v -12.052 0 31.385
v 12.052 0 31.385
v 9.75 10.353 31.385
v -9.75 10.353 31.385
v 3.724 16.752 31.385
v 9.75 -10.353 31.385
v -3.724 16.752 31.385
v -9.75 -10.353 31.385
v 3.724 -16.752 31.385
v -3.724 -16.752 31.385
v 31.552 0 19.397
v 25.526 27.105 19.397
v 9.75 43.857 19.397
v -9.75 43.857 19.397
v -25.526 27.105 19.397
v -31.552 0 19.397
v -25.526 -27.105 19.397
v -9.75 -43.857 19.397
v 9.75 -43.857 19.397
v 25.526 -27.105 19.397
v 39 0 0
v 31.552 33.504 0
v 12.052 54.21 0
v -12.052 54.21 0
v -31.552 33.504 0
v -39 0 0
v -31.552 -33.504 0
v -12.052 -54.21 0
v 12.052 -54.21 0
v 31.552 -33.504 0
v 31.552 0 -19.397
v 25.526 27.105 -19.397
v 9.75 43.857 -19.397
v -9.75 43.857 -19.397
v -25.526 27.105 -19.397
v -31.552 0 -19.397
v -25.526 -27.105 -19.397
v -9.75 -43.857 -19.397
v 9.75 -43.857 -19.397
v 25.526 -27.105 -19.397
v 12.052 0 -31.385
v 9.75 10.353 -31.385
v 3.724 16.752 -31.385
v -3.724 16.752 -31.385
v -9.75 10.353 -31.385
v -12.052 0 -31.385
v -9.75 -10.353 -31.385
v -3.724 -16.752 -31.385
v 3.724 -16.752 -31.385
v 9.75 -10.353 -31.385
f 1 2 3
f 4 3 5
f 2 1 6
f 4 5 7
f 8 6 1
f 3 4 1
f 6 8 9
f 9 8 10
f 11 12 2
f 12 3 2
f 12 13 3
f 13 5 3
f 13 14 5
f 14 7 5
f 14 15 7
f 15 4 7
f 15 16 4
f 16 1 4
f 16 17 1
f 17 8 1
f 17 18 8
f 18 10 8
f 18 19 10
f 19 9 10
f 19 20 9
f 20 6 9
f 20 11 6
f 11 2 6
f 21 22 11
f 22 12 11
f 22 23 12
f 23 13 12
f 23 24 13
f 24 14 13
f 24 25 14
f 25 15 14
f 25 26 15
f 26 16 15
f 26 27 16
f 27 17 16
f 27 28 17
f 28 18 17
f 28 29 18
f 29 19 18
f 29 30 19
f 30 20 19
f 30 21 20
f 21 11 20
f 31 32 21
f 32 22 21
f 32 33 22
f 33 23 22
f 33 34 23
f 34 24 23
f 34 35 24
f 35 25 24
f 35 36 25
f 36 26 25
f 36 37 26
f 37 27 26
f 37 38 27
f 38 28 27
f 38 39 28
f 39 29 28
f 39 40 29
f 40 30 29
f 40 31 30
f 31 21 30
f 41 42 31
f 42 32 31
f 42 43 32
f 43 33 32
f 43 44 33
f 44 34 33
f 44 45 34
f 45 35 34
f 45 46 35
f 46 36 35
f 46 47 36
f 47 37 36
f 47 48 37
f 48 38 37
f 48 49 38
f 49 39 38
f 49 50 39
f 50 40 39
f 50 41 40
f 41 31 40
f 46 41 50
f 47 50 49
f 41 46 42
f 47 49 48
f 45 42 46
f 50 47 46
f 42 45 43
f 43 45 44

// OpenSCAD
// Generated by SolidPython 1.0.1 on 2020-07-29 00:46:51


scale(v = [13, 19, 11]) {
	sphere(r = 3);
}
/***********************************************
*********      SolidPython code:      **********
************************************************
 
# import packages: SolidPython
from solid import *
from solid.utils import *
from itertools import chain, combinations, permutations


class Resize:

    def __init__(self, scad_file):
        self.scad_file = scad_file
        #self.scad_file = import_scad(scad_file)
        # cone/cylinder param:
        self.r1 = 0
        self.r2 = 0
        self.h = 0
        # rectangular prism param:
        self.w = 0
        self.l = 0
        # ellipse param:
        self.r = 0

    # import OpenScad code (file name corresponds to shape)


    # classify shape + parameters
    def assign(self, param1, param2, param3):
        if self.scad_file == 'cone.scad':
            self.r1 = param1
            self.r2 = param2
            self.h = param3
        elif self.scad_file == 'cylinder.scad':
            self.r1 = param1
            self.r2 = param2
            self.h = param3
        elif self.scad_file == 'rectangularPrism.scad':
            self.h = param1
            self.l = param2
            self.w = param3
        else:
            self.r = param1
            self.h = param2

    # resize parameters
    def iterate(self):
        x = range(3, 20, 2)
        i = 1
        if self.scad_file == 'cone.scad':
            tempList = list(permutations(x, 2))
            for temp in tempList:
                param1 = temp[0]
                param2 = temp[1]
                filepath = 'produced_scad_files/' + 'cone' + str(param1) + '_' + str(param2) + '_' + '.scad'
                scad_render_to_file(cylinder(h=param1, r1=param2, r2=0), filepath)

        elif self.scad_file == 'cylinder.scad':
            tempList = list(permutations(x, 3))
            for temp in tempList:
                param1 = temp[0]
                param2 = temp[1]
                filepath = 'produced_scad_files/' + 'cylinder' + str(param1) + '_' + str(param2) + '_' + '.scad'
                scad_render_to_file(cylinder(h=param1, r1=param2, r2=param2), filepath)

        elif self.scad_file == 'rectangularPrism.scad':
            tempList = list(permutations(x, 3))
            for temp in tempList:
                param1 = temp[0]
                param2 = temp[1]
                param3 = temp[2]
                filepath = 'produced_scad_files/' + 'rectangularPrism' + str(param1) + '_' + str(param2) + '_' + str(
                    param3) + '.scad'
                scad_render_to_file(cube(size=(param1, param2, param3)), filepath)

        elif self.scad_file == 'ellipse.scad':
            tempList = list(permutations(x, 4))
            for temp in tempList:
                param1 = temp[0]
                param2 = temp[1]
                param3 = temp[2]
                param4 = temp[3]
                filepath = 'produced_scad_files/' + 'ellipse' + str(param1) + '_' + str(param2) + '_' + str(param3) + '_' + str(param4) + '.scad'
                scad_render_to_file(scale([param1, param2, param3])(sphere(r=param4)), filepath)

    def render_to_scadfile(self):
        scad_render_to_file(scad, 'example.scad') 
 
************************************************/
